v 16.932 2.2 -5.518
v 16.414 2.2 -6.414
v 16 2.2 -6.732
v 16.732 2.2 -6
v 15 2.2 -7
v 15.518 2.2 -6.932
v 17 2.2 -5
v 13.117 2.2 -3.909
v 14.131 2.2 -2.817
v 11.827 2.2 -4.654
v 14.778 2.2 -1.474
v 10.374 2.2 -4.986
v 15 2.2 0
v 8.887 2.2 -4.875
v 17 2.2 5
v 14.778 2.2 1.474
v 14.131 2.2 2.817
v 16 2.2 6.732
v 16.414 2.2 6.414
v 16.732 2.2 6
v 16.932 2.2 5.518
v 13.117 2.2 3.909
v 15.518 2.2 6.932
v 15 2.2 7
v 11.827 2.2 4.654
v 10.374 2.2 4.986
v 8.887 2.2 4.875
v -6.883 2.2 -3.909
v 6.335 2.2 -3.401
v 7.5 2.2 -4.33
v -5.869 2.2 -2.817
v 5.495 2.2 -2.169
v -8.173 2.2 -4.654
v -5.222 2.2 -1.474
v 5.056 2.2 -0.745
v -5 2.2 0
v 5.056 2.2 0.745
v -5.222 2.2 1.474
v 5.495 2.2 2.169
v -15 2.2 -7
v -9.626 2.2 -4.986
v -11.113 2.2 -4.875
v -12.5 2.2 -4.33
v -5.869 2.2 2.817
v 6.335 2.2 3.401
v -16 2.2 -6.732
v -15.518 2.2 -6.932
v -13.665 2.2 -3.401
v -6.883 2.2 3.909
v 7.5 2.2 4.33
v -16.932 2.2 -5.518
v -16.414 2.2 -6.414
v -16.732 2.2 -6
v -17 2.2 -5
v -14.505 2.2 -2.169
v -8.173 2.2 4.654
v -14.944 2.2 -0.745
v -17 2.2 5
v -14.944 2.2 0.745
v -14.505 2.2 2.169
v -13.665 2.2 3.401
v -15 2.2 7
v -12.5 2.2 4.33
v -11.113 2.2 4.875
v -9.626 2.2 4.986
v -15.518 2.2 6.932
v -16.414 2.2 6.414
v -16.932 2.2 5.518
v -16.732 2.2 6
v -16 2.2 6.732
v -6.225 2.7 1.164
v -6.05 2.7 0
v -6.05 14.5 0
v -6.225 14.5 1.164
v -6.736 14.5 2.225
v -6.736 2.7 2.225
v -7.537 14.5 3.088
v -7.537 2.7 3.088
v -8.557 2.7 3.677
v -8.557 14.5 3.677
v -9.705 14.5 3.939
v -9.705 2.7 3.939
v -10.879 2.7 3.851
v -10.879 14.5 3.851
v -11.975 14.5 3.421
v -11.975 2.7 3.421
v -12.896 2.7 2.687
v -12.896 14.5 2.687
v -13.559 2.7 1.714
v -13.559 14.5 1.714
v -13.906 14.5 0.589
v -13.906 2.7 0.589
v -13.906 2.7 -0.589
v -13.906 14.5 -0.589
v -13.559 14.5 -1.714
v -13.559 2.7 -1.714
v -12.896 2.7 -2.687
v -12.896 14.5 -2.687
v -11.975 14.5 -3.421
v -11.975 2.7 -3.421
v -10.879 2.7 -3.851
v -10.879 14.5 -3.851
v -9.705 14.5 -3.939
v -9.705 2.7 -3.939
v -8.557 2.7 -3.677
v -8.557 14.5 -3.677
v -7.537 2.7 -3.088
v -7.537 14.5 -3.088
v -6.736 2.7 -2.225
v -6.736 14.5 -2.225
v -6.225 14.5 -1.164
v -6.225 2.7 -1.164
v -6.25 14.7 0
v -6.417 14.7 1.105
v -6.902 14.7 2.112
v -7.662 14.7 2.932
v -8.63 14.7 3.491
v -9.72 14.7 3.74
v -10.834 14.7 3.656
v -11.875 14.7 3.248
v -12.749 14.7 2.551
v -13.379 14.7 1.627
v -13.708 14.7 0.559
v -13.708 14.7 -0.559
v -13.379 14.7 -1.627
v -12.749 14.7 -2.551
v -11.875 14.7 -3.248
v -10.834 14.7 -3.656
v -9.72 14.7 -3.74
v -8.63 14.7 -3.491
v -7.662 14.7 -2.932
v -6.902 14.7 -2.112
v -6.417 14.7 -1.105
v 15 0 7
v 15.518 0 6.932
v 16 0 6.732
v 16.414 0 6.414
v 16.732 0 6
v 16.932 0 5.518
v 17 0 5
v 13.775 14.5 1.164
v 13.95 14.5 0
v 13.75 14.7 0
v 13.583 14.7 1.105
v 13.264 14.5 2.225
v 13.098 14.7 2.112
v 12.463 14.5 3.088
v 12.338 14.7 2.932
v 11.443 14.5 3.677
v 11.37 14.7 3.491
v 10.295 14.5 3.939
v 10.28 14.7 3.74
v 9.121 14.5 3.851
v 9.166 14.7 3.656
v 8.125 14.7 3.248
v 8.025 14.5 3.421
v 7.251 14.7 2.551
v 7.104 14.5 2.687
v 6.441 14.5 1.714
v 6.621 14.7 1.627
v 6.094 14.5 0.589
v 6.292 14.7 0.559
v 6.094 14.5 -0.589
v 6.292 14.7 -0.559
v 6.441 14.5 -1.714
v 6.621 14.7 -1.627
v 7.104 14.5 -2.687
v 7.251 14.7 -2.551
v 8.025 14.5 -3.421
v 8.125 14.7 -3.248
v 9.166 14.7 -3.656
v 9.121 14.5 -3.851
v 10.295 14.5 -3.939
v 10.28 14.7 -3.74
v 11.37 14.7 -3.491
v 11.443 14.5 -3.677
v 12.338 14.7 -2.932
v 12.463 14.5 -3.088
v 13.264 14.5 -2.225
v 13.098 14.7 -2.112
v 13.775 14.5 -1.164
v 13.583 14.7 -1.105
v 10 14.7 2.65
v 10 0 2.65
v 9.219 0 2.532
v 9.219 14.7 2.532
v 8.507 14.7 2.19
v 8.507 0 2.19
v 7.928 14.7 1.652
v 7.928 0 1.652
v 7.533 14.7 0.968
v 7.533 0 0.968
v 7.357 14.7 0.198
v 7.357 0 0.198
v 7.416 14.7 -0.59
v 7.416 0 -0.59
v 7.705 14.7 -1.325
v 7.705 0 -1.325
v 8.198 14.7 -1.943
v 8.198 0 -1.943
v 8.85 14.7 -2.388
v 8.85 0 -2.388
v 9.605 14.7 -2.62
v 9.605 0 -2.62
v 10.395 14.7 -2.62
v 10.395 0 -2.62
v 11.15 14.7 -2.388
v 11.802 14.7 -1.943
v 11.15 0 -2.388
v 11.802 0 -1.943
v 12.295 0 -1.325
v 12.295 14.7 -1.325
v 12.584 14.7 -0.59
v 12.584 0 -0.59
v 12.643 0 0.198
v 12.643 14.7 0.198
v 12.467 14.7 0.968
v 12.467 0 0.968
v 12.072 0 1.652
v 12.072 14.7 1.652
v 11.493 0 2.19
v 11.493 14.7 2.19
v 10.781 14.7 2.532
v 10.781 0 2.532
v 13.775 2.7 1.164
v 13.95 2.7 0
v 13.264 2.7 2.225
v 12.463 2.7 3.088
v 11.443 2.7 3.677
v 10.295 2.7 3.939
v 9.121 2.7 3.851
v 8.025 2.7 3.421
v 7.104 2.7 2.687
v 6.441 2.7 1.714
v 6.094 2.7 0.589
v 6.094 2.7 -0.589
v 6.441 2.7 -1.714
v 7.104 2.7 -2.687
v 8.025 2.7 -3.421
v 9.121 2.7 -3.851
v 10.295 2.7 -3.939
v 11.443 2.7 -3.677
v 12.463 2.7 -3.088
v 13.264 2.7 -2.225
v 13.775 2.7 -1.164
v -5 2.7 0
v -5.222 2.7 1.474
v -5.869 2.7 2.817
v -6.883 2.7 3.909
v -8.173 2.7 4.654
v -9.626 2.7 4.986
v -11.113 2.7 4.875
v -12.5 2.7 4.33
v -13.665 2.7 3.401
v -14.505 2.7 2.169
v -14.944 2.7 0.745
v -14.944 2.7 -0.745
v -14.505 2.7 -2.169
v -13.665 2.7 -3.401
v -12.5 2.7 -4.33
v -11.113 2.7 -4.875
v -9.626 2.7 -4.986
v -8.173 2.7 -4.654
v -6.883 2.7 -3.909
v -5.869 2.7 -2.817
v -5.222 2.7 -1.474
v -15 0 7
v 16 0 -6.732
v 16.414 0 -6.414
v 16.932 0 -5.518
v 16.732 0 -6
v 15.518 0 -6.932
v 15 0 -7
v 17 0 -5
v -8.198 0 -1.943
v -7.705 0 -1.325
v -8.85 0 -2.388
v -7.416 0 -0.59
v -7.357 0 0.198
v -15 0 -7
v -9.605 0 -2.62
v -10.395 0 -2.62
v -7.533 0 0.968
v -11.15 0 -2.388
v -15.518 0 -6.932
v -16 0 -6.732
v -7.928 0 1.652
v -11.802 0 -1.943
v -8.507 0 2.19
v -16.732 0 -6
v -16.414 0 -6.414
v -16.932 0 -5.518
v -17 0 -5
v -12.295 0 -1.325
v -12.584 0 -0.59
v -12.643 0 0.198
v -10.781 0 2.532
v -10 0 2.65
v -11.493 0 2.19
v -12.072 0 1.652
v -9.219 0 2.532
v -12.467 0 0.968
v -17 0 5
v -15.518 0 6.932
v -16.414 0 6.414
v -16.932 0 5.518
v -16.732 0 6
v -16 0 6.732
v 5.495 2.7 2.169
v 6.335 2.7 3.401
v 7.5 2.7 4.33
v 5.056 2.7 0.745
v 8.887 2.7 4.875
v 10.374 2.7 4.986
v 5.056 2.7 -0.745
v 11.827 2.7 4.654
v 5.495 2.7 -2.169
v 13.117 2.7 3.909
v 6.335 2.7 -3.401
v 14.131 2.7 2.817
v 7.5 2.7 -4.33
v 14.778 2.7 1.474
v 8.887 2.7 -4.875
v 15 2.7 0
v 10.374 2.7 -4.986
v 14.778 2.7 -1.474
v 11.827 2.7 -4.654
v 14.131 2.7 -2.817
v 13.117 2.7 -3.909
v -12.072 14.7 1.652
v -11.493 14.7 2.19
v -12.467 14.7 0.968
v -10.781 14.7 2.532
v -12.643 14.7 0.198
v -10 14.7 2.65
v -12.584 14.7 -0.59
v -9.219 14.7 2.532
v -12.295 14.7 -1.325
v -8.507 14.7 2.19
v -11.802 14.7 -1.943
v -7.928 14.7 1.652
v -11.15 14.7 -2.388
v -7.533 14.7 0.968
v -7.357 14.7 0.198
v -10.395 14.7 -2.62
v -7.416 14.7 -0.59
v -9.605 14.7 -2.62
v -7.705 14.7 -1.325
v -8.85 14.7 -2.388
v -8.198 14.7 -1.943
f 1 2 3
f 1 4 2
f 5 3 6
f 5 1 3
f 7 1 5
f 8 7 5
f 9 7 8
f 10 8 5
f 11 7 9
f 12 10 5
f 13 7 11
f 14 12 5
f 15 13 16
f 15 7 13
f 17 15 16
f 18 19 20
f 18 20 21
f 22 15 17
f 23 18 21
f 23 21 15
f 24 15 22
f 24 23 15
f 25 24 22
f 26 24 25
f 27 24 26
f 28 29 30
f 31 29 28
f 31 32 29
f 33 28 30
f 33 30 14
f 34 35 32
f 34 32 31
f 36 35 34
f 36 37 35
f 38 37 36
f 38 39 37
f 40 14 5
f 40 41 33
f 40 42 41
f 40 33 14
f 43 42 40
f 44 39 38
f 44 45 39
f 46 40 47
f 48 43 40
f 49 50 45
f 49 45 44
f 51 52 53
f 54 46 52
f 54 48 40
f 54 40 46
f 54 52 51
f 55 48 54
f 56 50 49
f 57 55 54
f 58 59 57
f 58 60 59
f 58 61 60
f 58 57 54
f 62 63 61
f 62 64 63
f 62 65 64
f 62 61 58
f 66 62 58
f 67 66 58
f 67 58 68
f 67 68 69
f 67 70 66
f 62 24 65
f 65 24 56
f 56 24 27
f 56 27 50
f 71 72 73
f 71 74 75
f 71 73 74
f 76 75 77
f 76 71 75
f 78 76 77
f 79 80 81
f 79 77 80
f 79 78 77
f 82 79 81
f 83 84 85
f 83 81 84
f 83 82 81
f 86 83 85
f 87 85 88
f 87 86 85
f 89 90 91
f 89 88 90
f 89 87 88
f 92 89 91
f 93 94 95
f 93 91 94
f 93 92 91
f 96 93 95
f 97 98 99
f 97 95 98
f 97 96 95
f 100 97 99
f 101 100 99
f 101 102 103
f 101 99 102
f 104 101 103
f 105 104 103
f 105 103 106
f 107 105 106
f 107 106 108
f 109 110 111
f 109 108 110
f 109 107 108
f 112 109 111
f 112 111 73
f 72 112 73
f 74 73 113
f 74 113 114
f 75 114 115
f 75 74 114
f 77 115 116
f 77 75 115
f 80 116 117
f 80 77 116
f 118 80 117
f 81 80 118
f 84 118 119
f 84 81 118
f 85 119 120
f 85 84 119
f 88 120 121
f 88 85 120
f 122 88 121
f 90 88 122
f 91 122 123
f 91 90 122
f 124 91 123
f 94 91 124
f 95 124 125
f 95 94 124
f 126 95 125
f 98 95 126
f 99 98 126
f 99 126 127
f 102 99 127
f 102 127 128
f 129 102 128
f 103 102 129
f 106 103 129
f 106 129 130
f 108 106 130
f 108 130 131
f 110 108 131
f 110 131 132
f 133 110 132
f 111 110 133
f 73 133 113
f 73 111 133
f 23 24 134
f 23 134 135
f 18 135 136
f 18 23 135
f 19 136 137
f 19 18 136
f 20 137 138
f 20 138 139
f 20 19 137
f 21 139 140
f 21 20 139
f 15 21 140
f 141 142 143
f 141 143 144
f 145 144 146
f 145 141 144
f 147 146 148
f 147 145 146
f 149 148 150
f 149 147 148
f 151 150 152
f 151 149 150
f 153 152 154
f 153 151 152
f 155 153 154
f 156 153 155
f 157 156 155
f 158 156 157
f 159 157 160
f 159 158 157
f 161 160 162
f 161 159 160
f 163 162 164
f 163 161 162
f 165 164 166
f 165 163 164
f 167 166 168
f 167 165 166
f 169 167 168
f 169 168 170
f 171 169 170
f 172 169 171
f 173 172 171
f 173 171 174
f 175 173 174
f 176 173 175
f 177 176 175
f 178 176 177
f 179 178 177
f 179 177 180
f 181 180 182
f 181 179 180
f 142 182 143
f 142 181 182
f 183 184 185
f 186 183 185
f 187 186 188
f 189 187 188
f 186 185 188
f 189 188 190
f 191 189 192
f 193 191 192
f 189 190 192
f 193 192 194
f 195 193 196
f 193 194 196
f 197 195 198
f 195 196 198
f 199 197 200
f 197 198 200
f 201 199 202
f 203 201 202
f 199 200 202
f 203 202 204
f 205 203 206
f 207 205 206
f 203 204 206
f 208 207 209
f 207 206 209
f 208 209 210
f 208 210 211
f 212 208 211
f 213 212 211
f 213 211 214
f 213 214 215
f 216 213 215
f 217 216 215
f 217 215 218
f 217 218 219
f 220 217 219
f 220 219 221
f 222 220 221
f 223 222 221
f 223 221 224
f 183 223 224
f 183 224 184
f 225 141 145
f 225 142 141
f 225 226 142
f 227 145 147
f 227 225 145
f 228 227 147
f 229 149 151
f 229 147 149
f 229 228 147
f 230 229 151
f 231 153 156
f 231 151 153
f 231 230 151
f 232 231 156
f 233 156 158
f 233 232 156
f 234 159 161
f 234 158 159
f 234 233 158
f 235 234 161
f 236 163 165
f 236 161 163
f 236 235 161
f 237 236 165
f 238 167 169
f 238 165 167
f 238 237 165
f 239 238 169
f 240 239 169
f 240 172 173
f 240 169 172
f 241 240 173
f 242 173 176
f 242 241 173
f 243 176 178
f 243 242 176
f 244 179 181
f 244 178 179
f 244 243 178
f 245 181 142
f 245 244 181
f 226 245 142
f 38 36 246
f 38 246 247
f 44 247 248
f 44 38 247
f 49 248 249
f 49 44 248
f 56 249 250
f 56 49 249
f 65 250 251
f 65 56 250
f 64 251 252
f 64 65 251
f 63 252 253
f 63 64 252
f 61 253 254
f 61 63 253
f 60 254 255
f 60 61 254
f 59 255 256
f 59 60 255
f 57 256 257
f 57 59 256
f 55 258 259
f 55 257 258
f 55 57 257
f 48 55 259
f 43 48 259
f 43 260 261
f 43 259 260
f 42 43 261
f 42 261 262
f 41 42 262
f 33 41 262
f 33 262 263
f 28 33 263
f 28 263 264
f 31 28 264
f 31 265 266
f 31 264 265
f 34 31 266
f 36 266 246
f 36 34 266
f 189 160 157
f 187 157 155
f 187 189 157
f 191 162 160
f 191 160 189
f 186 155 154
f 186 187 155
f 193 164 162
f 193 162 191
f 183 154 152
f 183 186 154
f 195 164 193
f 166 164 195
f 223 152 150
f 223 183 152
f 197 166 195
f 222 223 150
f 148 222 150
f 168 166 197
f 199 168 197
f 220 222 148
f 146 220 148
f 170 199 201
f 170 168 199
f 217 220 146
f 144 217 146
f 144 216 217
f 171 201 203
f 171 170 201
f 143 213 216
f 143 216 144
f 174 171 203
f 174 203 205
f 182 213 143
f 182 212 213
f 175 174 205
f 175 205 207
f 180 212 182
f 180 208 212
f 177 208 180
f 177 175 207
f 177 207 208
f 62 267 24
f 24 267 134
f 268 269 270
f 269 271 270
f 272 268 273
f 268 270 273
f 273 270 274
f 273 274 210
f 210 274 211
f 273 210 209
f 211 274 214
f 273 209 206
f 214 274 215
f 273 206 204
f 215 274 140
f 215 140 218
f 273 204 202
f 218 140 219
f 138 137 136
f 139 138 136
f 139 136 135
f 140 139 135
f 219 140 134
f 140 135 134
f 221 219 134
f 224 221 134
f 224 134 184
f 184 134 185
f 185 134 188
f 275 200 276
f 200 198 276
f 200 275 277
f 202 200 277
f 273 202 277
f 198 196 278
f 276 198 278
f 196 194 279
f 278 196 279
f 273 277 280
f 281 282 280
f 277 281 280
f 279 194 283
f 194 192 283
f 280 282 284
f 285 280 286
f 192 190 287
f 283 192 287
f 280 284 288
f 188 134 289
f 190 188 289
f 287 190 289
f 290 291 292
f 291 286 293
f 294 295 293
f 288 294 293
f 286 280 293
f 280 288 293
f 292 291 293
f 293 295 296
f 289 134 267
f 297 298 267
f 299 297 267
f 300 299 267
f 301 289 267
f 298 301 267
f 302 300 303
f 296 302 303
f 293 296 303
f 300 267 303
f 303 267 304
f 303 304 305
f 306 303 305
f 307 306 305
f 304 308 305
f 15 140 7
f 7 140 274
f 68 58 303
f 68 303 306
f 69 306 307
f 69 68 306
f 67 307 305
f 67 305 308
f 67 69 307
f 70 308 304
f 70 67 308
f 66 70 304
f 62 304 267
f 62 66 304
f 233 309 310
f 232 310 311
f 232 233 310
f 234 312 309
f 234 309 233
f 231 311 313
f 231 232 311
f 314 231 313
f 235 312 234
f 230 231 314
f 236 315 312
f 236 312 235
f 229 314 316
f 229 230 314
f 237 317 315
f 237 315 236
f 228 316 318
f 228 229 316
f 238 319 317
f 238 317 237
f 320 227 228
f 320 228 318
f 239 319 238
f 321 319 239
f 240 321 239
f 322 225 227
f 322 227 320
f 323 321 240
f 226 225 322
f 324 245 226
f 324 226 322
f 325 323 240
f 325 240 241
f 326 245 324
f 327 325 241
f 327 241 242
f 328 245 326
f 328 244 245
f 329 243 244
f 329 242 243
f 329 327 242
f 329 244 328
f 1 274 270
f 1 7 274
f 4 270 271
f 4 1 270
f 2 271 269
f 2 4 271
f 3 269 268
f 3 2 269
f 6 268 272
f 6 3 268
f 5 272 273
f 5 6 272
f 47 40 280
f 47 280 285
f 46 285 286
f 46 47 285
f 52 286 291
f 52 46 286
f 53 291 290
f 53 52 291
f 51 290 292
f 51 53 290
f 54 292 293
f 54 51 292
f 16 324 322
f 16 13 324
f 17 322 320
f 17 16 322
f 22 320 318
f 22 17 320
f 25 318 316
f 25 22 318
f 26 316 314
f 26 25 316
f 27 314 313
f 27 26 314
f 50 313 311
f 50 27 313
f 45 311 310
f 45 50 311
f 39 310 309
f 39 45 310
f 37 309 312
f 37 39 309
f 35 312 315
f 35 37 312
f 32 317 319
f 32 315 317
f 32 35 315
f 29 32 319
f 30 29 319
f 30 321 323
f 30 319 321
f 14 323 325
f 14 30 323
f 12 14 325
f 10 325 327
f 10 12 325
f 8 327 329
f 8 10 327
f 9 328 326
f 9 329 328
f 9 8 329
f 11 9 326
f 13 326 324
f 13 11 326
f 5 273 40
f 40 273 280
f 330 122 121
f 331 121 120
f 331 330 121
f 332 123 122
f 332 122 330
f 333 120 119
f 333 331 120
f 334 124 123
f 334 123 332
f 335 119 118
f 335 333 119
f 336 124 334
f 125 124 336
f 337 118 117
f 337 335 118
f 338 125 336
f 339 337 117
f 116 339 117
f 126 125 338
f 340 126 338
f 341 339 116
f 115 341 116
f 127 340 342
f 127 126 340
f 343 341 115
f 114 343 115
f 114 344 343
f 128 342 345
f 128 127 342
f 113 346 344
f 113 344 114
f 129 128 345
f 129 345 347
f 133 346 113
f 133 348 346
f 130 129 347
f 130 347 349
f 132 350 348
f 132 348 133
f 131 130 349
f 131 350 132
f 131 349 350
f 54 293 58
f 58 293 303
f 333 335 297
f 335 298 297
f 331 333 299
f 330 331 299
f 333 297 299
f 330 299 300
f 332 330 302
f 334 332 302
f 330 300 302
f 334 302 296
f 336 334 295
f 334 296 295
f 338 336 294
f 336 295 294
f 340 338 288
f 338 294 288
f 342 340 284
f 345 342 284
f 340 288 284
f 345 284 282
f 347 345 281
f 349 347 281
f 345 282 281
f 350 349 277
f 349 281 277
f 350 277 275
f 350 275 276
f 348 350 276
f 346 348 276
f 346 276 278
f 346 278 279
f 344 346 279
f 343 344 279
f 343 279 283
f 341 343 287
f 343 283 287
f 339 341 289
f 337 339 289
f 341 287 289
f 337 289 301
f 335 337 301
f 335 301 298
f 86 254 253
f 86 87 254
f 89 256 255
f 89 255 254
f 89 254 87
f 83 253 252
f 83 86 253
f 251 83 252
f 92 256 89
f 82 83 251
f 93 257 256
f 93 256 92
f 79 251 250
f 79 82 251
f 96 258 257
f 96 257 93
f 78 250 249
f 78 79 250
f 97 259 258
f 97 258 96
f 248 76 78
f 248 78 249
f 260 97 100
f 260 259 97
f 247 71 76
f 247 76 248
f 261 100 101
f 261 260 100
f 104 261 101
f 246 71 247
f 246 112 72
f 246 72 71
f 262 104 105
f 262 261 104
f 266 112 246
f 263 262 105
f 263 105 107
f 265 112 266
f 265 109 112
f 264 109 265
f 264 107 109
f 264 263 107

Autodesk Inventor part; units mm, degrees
ref_plane "YZ Plane" through (0, 0, 0) normal (1, 0, 0) x (0, 1, 0)
ref_plane "XZ Plane" through (0, 0, 0) normal (0, 1, 0) x (-1, 0, 0)
ref_plane "XY Plane" through (0, 0, 0) normal (0, 0, 1) x (1, 0, 0)
sketch "スケッチ1" plane through (0, 0, 0) normal (0, 1, 0) x (-1, 0, 0)
  line L0 (17, 7) -> (-17, 7)
  line L1 (-17, 7) -> (-17, -7)
  line L2 (-17, -7) -> (17, -7)
  line L3 (17, -7) -> (17, 7)
  line L4 (17, 7) -> (-17, -7) construction
  line L5 (-17, 7) -> (17, -7) construction
  point P0 (0, 0)
  dimension "d0" = 34
  dimension "d1" = 14
extrude "押し出し1" add sketch "スケッチ1" along normal blind 2.2
sketch "スケッチ2" plane through (0, 2.2, 0) normal (0, 1, 0) x (1, 0, 0)
  circle A0 centre (-10, 0) radius 5
  circle A1 centre (10, 0) radius 5
  point P0 (0, 0)
  dimension "d4" = 10
  dimension "d5" = 10
  dimension "d6" = 10
  dimension "d7" = 10
extrude "押し出し2" add sketch "スケッチ2" along normal blind 0.5
sketch "スケッチ3" plane through (-10, 2.7, 0) normal (0, 1, 0) x (1, 0, 0)
  circle A0 centre (0, 0) radius 5 projected
  circle A1 centre (20, 0) radius 5 projected
  circle A2 centre (0, 0) radius 3.95
  circle A3 centre (20, 0) radius 3.95
  point P0 (10, 0)
  dimension "d10" = 7.9
  dimension "d11" = 7.9
extrude "押し出し3" add sketch "スケッチ3" along normal blind 12 contours A2 | A3
sketch "スケッチ5" plane through (-10, 14.7, 0) normal (0, 1, 0) x (1, 0, 0)
  circle A0 centre (0, 0) radius 3.95 projected
  circle A1 centre (20, 0) radius 3.95 projected
  point P0 (10, 0)
hole "穴2" at (10, 14.7, 0) at (-10, 14.7, 0) direction (0, -1, 0) diameter 5.3 end through all clearance for "Socket Head Cap Screw" size "M5" standard "Ansi Metric M Profile"
chamfer "面取り2" distance 0.2 angle 45 2 edges at (-13.95, 14.7, 0) (6.05, 14.7, 0)
fillet "フィレット2" radius 2 4 edges at (17, 1.1, 7) (17, 1.1, -7) (-17, 1.1, 7) (-17, 1.1, -7)
equation "\"d5\" = d4"
equation "\"d10\" = d11"
properties part number "scara-base8" material "ABS プラスチック"
